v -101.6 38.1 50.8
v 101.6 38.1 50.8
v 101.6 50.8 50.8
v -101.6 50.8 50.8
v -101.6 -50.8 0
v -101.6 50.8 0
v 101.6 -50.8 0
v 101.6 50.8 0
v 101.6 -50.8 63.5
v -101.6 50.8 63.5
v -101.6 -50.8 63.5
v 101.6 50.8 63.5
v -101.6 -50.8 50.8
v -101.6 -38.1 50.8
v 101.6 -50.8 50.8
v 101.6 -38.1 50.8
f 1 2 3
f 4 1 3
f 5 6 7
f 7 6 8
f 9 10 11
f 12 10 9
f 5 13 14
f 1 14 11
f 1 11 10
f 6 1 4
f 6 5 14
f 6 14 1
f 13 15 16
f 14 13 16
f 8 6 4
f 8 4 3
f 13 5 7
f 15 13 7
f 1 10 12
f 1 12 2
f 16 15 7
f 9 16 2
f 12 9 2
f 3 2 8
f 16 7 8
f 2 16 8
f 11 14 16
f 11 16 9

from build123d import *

# Parameters (mm, degrees)
F0_W     = 203.2
F0_H     = 101.6
F1_DEPTH = 63.5
F3_DEPTH = 215.9
F5_DEPTH = 215.9


with BuildPart() as f1:
    # F0 (on Top) → F1 (new body)
    with BuildSketch(Plane.XY):
        Rectangle(F0_W, F0_H)
    extrude(amount=F1_DEPTH)

    # F2 (on face) → F3 (cut)
    with BuildSketch(Plane.YZ.offset(101.6)):
        Polygon((50.8, 50.8), (50.8, 63.5), (38.1, 50.8), align=None)
    extrude(amount=-F3_DEPTH, mode=Mode.SUBTRACT)

    # F4 (on face) → F5 (cut)
    with BuildSketch(Plane.YZ.offset(101.6)):
        Polygon((-38.1, 50.8), (-50.8, 63.5), (-50.8, 50.8), align=None)
    extrude(amount=-F5_DEPTH, mode=Mode.SUBTRACT)


solid = f1.part
